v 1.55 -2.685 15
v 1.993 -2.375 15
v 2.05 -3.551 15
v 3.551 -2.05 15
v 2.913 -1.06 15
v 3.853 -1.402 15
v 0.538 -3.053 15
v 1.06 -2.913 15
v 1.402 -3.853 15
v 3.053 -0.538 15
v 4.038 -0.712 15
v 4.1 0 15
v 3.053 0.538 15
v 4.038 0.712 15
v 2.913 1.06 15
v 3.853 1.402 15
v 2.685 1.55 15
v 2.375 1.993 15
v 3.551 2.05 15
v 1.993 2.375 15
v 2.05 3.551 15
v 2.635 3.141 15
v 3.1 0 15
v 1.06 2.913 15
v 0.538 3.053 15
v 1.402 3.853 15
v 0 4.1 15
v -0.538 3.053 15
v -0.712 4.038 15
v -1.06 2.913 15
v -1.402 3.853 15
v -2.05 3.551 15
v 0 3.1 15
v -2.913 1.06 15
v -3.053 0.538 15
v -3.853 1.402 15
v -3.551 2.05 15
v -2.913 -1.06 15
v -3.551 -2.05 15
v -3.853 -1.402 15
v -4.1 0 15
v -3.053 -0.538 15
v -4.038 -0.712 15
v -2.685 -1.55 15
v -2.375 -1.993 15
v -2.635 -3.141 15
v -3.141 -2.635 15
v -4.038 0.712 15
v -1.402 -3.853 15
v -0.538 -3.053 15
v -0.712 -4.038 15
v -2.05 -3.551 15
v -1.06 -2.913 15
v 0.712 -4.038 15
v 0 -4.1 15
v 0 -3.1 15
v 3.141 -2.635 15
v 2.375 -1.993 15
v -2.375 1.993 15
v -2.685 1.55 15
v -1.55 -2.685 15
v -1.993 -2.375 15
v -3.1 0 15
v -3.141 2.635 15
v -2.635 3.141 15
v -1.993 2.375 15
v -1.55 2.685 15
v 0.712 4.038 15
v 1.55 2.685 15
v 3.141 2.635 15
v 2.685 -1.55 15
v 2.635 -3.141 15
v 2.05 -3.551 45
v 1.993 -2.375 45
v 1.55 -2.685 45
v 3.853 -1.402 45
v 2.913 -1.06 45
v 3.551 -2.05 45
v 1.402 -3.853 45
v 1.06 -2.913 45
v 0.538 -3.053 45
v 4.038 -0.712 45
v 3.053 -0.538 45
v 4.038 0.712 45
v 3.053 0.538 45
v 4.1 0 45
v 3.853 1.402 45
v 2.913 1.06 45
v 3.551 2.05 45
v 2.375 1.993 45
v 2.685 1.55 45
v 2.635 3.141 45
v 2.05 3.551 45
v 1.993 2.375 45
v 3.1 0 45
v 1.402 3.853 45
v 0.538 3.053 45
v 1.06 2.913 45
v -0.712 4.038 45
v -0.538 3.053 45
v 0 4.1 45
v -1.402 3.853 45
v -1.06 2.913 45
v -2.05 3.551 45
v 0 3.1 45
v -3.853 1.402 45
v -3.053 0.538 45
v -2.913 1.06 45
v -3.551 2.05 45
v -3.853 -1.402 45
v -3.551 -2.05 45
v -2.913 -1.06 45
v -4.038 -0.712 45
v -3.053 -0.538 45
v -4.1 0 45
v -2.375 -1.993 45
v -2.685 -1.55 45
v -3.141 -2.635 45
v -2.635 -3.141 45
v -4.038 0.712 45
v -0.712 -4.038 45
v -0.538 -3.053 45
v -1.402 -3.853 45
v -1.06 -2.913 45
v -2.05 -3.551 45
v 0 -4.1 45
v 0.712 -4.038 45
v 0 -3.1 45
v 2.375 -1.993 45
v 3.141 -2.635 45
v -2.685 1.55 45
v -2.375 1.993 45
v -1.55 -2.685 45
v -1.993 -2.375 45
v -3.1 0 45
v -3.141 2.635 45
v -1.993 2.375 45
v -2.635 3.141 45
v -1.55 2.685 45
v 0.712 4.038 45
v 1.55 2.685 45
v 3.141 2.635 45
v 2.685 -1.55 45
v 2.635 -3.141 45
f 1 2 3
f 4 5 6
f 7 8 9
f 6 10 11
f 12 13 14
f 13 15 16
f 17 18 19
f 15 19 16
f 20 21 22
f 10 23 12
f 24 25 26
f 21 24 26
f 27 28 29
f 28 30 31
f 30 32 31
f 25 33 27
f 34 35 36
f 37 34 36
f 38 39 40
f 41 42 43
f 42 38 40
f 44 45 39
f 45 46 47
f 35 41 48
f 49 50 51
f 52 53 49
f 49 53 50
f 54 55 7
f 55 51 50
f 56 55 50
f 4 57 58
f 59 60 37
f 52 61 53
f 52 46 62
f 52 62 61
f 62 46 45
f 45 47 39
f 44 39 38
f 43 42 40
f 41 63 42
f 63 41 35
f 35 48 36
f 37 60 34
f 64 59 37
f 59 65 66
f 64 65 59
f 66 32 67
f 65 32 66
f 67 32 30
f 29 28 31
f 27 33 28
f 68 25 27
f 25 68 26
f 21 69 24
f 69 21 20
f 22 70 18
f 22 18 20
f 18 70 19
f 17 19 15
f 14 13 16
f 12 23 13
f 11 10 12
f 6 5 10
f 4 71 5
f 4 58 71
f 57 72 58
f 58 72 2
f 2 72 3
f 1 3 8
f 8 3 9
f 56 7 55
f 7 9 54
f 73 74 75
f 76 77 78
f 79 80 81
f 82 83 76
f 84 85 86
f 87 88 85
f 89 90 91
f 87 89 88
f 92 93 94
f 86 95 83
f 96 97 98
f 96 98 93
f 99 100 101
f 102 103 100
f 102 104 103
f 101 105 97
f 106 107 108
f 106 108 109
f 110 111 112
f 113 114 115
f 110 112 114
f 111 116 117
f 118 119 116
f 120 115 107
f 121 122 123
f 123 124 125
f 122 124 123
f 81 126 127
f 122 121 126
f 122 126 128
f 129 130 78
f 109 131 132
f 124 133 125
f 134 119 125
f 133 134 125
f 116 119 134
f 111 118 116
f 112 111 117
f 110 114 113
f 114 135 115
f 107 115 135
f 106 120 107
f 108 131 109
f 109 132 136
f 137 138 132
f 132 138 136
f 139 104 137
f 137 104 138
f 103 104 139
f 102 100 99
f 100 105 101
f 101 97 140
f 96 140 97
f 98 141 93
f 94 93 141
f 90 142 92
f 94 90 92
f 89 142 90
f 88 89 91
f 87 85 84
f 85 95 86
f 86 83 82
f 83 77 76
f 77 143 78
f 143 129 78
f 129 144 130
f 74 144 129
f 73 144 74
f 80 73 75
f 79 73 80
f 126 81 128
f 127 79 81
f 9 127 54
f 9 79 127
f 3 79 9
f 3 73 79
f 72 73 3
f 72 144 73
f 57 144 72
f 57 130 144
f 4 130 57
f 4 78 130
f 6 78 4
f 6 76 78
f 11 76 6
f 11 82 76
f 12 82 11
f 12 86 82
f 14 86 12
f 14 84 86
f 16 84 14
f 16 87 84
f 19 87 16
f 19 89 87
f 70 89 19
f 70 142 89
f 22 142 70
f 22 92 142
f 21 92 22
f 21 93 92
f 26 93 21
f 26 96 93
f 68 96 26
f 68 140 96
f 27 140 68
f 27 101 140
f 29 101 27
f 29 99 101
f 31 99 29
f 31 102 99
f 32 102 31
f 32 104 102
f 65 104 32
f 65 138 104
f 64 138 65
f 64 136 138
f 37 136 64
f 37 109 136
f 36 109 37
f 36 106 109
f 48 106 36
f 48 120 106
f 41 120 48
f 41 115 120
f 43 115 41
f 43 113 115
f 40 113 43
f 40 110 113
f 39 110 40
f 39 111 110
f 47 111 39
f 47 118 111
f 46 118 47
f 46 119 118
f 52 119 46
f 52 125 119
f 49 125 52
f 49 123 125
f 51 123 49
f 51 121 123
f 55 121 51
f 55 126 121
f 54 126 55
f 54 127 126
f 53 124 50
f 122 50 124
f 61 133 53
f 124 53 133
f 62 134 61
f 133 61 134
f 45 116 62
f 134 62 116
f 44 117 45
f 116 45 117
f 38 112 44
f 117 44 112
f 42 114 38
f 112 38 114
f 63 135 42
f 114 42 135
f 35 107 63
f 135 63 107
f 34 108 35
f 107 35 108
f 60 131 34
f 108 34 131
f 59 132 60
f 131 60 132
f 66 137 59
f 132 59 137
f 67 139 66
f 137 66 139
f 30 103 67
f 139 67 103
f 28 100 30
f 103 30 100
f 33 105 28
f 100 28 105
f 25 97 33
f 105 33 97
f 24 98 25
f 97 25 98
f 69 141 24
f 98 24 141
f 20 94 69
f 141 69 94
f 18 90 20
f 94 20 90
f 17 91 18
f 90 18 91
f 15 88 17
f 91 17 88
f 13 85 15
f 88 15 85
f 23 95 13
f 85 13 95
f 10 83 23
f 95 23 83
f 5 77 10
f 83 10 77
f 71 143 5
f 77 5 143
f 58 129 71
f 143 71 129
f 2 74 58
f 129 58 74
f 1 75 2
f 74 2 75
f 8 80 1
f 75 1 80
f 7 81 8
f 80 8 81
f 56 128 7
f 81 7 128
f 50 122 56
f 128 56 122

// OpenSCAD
// file: pointy_polygon.scad
function logistic(x, k=1, g=3) = g * (1 / (1 + exp(-k * x)) - 1/2);

function r(rad, b, fn, k, g) = rad - logistic(min(b, fn + 1 - b), k, g);

function angle(a, b, verts, step) = a * 360 / verts + b * step;

module pointy(rad=3, fn = 2, verts=3, k=1, g=3) {
    step = 360 / ((fn + 1) * verts);
    points = concat(
        [for(a = [0 : verts - 1])
            for(b = [0 : fn])[
                r(rad, b, fn, k / fn, g) * cos(angle(a, b, verts, step)), r(rad, b, fn, k / fn, g) * sin(angle(a, b, verts, step))
            ]
        ]
    );
    echo([0 : 1 : verts]);
    polygon(points);
}

linear_extrude(height = 2, center = true, convexity = 10){
    pointy(verts=20, fn=20, k=7, g=5, rad=20);
}
// main file
use <MCAD/involute_gears.scad>
use <pointy_polygon.scad>

R = 60;
r = 0;
a_r = 3;
t = 2;
h = 3;

tol = 0.2;

axil_span = 60;
grip_t = 1;
grip_length = 30;

spokes = 6;

res = 36;

pitch = 230;
gear_r =  26.5;
teeth = round(gear_r * 360/pitch);
gear_h = 5;

wheel = false;
if (wheel){
linear_extrude(height=h){
    difference(){
        pointy(verts=120, $fn=680, k=3, g=10, rad=R + 3);
        circle(R-t, $fn=res);
    }
    for (i = [0:spokes-1]){
        spoke_l = R - r - t/2;
        rotate(i * 360 / spokes){
            translate([spoke_l / 2 + r, 0]){
                square([spoke_l, t], center=true);
            }
        }
    }
}
linear_extrude(height=axil_span/2 + t){
    circle(a_r, $fn=res);
}
}

grip_tol = 0.1;
grip = true;
if(grip){
translate([0, 0, axil_span/2]){
    linear_extrude(height=grip_length, center=true){
        difference(){
            circle(a_r + grip_tol + grip_t, $fn=res);
            circle(a_r + grip_tol, $fn=res);
        }
    }
}
}

gear = false;
if(gear && wheel){
translate([0, 0, h])
difference(){
    bevel_gear (
        number_of_teeth=teeth, 
        cone_distance=70, 
        face_width=gear_h, 
        outside_circular_pitch=pitch, 
        pressure_angle=30,
        clearance = 0.2, 
        bore_diameter=0,
        gear_thickness = 2, 
        backlash = 0, 
        involute_facets=0, 
        finish = -1);

    cylinder(10, r1=gear_r - 2*t, r2=gear_r - 2*t, $fn=20);

}
translate([0, 0, h])
linear_extrude(height=gear_h)
for (i = [0:spokes-1]){
    gea_r = gear_r - 2*t;
    rotate(i * 360 / spokes){
        translate([gea_r/2, 0]){
            square([gea_r, t], center=true);
        }
    }
}
}
